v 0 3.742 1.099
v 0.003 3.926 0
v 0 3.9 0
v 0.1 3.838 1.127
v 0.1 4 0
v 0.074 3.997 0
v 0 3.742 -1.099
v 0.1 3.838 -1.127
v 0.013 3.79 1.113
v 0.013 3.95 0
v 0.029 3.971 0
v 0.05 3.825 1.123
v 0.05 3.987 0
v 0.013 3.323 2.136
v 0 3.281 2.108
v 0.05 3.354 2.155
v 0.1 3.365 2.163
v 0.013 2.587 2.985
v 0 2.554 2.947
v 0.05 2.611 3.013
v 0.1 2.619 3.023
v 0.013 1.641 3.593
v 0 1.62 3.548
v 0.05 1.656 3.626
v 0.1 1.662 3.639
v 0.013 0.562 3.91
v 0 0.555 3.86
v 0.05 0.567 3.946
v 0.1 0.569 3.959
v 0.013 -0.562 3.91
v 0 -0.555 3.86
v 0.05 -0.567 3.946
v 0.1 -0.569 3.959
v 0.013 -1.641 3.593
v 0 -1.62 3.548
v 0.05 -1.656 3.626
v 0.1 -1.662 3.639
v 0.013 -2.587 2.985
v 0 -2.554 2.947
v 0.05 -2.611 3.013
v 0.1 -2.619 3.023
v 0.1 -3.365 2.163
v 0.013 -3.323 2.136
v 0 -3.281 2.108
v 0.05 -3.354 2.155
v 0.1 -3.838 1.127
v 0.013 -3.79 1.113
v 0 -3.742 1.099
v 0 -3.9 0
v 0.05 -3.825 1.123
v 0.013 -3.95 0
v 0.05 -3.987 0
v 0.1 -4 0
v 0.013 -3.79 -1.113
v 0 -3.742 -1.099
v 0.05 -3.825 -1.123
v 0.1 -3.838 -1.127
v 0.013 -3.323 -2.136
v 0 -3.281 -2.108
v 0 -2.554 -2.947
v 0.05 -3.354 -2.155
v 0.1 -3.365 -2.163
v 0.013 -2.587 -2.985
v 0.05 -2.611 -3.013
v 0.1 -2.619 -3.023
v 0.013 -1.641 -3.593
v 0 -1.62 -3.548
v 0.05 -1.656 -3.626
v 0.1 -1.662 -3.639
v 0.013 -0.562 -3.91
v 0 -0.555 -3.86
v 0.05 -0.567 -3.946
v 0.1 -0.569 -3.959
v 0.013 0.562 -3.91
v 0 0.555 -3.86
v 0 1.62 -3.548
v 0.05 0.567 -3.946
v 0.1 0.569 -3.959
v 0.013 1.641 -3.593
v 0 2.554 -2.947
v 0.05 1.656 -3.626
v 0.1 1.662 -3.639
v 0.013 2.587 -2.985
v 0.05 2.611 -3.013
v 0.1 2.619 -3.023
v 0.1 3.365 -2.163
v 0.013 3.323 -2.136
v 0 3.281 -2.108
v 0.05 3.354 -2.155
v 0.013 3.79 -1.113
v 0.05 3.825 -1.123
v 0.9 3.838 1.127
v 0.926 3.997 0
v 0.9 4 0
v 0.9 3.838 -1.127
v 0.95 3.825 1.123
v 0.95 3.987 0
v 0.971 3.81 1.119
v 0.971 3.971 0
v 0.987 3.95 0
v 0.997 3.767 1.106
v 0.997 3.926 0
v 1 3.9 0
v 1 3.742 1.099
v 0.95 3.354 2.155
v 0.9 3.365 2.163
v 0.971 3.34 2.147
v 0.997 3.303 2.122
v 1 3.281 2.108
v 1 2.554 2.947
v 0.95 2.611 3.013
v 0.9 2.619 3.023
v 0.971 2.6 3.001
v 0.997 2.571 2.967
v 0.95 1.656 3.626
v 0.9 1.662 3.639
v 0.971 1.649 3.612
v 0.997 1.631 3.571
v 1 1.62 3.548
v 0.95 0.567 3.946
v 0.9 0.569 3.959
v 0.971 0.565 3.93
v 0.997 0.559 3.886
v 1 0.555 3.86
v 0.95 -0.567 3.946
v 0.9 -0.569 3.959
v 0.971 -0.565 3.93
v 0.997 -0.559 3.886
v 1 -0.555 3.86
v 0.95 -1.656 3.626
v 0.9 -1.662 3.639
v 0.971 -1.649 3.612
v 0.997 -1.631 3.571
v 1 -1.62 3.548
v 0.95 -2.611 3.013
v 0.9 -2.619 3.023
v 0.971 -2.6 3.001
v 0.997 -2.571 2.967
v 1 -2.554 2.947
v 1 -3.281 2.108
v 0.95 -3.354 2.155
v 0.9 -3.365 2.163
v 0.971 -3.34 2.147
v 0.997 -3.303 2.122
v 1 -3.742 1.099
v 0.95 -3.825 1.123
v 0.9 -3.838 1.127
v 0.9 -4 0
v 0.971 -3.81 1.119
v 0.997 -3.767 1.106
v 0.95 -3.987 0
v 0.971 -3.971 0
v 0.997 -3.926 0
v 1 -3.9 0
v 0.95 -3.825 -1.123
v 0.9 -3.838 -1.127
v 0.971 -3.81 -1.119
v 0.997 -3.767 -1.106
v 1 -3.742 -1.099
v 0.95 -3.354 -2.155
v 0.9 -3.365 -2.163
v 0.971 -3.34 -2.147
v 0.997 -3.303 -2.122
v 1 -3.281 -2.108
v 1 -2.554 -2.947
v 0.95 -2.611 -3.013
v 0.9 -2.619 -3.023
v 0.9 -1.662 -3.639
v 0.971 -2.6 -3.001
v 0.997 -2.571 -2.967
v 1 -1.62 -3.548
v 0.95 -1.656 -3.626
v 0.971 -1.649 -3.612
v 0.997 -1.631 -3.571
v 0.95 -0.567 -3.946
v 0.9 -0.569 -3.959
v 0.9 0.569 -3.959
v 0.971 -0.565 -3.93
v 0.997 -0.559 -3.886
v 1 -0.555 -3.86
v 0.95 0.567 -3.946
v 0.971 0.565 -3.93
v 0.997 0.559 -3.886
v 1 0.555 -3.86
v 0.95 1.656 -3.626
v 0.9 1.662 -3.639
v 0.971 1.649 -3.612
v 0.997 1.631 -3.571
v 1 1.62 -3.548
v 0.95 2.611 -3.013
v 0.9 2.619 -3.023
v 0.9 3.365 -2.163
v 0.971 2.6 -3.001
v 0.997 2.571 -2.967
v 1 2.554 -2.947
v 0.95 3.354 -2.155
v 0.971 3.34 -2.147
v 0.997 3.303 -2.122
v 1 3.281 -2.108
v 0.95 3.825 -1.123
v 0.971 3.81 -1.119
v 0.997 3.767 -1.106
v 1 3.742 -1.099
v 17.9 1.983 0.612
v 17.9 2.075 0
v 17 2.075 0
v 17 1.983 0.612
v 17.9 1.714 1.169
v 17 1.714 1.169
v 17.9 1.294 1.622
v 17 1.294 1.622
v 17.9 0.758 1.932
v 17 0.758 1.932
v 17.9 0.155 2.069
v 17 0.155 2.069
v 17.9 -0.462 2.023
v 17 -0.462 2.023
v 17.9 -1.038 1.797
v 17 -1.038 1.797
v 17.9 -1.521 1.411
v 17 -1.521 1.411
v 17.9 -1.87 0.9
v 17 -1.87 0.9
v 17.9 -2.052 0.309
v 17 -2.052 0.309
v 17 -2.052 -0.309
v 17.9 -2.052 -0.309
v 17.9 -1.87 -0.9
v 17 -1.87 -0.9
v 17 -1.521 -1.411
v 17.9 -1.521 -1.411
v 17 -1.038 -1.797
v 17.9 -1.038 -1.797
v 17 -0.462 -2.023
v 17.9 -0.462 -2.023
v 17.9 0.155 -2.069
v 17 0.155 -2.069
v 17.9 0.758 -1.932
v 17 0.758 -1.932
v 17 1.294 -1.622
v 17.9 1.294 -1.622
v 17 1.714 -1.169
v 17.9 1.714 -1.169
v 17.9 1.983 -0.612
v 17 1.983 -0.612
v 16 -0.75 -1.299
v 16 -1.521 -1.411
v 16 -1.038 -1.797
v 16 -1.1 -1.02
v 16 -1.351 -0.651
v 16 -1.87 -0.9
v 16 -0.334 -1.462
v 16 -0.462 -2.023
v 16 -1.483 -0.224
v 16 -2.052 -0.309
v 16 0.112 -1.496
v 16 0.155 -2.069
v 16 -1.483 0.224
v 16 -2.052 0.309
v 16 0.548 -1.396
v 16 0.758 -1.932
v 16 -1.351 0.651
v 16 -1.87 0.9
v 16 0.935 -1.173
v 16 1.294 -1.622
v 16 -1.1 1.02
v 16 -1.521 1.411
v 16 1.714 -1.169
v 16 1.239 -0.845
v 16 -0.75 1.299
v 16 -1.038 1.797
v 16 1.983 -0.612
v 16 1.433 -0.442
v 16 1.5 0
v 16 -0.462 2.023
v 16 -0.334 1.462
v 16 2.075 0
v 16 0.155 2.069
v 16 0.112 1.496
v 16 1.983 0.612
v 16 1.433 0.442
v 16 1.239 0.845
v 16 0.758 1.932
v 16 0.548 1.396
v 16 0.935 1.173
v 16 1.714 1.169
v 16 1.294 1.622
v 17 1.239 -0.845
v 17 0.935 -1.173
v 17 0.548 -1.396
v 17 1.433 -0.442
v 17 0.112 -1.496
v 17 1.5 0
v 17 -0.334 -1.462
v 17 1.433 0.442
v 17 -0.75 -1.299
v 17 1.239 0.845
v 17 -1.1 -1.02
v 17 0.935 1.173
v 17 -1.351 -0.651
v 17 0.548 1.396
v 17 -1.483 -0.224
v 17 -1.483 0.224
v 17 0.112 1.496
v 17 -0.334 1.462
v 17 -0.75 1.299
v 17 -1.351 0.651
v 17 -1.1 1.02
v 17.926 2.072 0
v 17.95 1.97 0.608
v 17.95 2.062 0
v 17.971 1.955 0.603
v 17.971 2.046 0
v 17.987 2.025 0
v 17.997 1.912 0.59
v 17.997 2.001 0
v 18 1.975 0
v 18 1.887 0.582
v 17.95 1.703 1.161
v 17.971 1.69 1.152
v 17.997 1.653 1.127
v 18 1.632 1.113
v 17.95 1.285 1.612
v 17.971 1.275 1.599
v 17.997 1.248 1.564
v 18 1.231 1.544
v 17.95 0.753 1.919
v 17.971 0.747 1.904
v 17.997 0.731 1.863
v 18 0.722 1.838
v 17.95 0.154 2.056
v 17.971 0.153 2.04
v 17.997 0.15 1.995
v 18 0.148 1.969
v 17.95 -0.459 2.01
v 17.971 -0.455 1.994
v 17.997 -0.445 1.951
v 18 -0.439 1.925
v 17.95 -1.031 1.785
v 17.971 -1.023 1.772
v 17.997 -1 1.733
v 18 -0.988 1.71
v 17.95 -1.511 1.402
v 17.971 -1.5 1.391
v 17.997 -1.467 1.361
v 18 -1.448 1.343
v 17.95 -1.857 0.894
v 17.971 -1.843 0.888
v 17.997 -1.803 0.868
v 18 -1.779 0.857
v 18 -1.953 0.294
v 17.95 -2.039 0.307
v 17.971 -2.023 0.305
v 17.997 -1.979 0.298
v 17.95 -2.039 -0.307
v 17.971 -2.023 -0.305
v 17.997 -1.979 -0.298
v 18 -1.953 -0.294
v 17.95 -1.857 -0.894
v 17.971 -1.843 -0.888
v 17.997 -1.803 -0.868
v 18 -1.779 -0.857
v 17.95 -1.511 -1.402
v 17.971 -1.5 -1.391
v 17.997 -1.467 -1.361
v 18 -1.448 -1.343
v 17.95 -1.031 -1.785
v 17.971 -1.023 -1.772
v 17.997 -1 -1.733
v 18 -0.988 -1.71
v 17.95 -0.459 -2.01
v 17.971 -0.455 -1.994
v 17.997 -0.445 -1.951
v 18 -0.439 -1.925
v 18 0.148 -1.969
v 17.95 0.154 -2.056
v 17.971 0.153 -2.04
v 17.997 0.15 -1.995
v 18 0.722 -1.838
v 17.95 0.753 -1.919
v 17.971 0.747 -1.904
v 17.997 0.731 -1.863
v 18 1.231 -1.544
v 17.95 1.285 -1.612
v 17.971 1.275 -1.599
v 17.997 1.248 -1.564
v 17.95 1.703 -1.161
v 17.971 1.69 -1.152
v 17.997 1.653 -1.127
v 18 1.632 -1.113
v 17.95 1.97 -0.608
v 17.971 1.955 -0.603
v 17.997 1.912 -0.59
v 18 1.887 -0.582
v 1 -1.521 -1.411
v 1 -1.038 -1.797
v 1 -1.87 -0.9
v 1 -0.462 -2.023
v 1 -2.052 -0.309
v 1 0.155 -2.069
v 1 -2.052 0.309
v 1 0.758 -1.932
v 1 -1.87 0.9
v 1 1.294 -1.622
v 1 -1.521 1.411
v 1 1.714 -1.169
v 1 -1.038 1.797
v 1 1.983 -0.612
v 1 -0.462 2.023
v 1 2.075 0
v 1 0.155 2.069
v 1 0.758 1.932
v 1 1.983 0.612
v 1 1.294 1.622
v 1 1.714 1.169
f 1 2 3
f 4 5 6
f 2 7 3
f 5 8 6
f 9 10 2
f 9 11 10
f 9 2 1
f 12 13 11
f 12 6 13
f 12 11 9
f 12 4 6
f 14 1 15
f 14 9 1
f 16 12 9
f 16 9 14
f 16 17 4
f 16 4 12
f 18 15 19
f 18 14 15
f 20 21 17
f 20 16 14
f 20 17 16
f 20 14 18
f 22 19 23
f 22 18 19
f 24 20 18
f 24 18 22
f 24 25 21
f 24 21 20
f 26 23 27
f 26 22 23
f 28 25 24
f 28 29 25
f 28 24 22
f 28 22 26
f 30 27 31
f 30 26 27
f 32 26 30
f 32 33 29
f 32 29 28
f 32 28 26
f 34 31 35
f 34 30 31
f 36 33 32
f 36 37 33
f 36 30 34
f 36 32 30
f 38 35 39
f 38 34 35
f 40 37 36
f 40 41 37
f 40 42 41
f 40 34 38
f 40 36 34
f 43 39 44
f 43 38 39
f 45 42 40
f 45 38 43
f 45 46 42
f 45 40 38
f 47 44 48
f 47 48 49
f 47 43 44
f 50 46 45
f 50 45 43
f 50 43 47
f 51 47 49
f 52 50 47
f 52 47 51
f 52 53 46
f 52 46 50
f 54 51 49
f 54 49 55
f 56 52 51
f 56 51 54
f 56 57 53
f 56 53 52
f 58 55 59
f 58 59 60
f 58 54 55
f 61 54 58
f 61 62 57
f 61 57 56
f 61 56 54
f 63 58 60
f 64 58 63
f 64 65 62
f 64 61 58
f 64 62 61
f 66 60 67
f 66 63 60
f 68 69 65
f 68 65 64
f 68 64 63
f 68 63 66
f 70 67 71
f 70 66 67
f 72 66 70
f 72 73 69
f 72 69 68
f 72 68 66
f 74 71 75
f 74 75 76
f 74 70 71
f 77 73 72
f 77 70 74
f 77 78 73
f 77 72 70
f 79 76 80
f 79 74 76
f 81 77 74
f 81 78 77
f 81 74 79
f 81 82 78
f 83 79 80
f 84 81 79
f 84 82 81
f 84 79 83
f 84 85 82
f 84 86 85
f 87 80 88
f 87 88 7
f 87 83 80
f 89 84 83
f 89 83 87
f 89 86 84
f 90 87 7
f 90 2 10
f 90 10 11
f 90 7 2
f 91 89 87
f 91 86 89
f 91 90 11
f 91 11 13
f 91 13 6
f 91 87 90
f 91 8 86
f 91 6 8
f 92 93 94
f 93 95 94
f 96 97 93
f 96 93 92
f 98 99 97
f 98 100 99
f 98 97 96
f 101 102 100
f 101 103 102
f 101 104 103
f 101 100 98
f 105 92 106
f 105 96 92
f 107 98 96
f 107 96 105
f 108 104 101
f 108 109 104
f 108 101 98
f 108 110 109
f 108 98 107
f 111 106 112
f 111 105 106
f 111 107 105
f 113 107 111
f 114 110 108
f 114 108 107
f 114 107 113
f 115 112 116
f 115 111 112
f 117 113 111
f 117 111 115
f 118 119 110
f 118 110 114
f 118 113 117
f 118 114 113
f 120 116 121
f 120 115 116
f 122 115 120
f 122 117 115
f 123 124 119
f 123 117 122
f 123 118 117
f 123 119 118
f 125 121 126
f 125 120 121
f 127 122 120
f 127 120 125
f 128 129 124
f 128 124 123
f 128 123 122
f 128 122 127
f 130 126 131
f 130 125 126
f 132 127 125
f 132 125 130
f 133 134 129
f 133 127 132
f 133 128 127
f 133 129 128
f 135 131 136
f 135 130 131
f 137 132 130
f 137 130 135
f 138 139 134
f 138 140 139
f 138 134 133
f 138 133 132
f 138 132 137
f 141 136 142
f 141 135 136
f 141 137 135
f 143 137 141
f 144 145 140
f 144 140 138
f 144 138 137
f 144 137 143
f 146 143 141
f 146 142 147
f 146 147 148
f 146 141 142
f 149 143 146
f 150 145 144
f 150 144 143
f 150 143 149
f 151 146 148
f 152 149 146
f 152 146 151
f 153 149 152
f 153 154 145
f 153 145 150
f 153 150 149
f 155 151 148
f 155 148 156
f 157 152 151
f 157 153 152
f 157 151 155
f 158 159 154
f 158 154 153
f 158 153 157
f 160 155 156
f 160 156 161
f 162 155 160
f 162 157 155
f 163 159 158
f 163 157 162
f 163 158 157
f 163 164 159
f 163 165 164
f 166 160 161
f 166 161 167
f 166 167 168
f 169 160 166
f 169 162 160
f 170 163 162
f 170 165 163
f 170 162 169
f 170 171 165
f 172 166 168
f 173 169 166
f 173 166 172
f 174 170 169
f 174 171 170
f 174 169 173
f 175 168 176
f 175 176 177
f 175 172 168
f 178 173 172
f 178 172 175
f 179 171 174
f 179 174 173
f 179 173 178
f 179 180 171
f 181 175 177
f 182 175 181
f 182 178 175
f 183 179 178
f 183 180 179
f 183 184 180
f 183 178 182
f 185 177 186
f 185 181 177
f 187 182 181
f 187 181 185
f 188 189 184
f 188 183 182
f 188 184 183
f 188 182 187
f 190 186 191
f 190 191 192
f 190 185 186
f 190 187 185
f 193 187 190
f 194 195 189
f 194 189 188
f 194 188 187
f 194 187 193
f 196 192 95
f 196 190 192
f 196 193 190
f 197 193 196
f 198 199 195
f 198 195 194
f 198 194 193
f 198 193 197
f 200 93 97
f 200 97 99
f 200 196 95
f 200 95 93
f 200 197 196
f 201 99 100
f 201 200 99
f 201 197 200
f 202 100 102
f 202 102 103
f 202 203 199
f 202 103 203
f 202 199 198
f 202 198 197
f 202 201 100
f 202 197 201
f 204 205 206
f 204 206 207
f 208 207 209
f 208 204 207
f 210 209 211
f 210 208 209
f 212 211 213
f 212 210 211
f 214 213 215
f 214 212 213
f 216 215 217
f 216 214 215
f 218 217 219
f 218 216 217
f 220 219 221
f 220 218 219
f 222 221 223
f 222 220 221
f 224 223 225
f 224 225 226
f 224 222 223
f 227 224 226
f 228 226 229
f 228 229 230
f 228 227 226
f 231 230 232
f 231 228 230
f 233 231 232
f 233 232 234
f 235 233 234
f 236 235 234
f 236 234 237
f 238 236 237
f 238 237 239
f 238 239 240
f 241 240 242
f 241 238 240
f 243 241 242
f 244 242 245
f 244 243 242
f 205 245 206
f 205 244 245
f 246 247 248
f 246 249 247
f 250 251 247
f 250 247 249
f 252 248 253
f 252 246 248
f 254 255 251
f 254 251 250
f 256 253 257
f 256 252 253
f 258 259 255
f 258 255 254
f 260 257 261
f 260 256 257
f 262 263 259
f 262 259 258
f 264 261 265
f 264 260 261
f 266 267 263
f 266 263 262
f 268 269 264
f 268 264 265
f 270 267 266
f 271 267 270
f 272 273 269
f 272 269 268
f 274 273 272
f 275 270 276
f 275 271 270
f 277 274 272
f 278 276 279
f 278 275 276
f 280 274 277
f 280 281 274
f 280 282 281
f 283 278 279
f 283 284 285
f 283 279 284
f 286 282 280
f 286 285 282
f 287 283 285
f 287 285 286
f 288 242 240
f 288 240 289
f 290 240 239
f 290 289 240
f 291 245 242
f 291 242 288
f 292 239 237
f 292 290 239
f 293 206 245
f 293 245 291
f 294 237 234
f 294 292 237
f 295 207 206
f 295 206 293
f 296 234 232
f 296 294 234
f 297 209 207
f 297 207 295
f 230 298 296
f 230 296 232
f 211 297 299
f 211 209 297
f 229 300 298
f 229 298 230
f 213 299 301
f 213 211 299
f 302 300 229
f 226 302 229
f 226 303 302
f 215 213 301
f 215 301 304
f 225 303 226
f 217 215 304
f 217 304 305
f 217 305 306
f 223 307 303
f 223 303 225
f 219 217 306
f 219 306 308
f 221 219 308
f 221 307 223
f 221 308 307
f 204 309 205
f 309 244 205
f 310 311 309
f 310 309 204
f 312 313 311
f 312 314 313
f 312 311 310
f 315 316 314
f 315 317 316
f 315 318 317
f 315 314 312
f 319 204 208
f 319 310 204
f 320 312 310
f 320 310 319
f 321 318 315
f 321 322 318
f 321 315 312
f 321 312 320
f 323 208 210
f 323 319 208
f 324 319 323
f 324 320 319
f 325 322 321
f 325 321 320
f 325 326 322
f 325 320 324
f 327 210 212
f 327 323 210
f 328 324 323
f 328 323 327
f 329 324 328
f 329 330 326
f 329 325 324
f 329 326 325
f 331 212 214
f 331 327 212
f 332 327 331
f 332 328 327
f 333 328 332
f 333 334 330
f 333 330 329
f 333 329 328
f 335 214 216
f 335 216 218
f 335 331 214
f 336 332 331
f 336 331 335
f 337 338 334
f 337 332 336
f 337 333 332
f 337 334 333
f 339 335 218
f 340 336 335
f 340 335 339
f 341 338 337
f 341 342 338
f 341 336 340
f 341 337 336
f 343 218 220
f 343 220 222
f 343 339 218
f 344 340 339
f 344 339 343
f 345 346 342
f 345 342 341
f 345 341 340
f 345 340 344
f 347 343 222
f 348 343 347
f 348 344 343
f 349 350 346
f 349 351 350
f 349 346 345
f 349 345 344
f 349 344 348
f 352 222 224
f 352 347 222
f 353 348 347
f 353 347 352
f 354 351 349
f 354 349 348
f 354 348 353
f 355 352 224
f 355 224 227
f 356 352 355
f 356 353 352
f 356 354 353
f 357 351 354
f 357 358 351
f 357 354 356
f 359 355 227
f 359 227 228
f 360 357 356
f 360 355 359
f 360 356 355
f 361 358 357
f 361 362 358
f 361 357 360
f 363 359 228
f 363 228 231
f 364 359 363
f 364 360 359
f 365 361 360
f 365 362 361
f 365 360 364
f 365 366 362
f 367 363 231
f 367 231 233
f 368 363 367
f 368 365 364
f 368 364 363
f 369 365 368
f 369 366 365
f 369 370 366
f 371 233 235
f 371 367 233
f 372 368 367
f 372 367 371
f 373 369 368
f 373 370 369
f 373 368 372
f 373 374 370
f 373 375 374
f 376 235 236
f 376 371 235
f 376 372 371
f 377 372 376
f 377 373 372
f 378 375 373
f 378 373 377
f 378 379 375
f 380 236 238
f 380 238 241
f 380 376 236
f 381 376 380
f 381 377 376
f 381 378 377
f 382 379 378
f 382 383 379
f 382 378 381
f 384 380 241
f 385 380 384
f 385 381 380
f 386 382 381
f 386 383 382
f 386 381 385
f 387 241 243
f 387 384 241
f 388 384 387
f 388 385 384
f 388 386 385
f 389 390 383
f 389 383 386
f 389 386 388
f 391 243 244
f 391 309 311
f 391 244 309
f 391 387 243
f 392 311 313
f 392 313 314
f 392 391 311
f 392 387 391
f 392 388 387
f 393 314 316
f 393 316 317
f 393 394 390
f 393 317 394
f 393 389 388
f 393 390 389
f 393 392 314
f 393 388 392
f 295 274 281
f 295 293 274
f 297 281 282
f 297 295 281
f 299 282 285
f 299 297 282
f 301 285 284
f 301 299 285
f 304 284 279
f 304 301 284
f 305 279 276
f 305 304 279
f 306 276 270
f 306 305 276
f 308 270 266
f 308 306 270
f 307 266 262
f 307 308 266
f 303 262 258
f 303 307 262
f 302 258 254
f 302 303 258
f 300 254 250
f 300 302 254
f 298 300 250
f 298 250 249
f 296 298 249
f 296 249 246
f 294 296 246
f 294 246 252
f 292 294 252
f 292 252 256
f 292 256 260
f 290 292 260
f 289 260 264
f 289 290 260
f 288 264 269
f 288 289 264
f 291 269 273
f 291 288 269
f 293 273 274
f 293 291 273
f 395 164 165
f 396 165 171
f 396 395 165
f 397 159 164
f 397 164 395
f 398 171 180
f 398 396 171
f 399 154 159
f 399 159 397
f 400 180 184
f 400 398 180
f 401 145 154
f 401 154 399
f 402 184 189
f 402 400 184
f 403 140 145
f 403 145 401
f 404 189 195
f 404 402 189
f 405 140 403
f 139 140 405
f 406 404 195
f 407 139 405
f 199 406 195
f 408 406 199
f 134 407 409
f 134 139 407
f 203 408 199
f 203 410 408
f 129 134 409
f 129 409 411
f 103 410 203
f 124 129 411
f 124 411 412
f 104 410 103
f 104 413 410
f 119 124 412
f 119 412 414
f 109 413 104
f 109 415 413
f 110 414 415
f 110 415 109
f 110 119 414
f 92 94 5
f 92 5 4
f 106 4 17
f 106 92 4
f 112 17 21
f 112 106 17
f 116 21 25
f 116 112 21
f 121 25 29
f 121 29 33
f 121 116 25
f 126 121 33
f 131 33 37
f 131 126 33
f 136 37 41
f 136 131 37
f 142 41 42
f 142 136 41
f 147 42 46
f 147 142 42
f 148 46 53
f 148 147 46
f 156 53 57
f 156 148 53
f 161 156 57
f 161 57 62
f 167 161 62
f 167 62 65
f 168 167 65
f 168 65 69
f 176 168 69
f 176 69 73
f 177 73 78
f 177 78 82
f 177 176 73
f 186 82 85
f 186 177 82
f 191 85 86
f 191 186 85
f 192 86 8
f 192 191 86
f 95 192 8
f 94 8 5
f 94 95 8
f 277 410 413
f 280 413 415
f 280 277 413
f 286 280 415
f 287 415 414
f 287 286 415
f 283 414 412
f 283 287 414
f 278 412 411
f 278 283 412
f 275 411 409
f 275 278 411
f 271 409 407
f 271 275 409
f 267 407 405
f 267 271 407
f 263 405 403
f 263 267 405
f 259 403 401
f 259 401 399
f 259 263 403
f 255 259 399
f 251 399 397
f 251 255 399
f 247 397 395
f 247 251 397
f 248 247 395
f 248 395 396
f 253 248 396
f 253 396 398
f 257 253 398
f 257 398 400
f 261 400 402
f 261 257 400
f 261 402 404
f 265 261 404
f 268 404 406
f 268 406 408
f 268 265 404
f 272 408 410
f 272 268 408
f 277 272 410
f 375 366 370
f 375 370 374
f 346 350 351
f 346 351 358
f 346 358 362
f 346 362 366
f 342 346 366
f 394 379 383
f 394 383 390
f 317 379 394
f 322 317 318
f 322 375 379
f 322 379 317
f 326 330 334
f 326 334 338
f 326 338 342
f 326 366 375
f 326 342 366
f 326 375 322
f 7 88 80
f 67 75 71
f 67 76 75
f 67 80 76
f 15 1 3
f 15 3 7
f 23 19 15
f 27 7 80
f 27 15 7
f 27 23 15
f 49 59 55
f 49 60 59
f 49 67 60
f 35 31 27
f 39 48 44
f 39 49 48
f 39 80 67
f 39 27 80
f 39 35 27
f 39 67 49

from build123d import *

# Parameters (mm, degrees)
FILLET1_R = 0.1


with BuildPart() as part:
    # Sketch1 → Revolve1 (revolve)
    with BuildSketch(Plane.XY):
        Polygon((0, 0), (0, 4), (1, 4), (1, 2.075), (16, 2.075), (16, 1.5), (17, 1.5), (17, 2.075), (18, 2.075), (18, 0), align=None)
    revolve(axis=Axis((-1.619660583, 0, 0), (1, 0, 0)))

    # Fillet1
    fillet1_edges = [part.edges().sort_by_distance(p)[0] for p in [
        (1, -4, 0),
        (0, -4, 0),
        (18, -2.075, 0),
    ]]
    fillet(fillet1_edges, radius=FILLET1_R)


solid = part.part
